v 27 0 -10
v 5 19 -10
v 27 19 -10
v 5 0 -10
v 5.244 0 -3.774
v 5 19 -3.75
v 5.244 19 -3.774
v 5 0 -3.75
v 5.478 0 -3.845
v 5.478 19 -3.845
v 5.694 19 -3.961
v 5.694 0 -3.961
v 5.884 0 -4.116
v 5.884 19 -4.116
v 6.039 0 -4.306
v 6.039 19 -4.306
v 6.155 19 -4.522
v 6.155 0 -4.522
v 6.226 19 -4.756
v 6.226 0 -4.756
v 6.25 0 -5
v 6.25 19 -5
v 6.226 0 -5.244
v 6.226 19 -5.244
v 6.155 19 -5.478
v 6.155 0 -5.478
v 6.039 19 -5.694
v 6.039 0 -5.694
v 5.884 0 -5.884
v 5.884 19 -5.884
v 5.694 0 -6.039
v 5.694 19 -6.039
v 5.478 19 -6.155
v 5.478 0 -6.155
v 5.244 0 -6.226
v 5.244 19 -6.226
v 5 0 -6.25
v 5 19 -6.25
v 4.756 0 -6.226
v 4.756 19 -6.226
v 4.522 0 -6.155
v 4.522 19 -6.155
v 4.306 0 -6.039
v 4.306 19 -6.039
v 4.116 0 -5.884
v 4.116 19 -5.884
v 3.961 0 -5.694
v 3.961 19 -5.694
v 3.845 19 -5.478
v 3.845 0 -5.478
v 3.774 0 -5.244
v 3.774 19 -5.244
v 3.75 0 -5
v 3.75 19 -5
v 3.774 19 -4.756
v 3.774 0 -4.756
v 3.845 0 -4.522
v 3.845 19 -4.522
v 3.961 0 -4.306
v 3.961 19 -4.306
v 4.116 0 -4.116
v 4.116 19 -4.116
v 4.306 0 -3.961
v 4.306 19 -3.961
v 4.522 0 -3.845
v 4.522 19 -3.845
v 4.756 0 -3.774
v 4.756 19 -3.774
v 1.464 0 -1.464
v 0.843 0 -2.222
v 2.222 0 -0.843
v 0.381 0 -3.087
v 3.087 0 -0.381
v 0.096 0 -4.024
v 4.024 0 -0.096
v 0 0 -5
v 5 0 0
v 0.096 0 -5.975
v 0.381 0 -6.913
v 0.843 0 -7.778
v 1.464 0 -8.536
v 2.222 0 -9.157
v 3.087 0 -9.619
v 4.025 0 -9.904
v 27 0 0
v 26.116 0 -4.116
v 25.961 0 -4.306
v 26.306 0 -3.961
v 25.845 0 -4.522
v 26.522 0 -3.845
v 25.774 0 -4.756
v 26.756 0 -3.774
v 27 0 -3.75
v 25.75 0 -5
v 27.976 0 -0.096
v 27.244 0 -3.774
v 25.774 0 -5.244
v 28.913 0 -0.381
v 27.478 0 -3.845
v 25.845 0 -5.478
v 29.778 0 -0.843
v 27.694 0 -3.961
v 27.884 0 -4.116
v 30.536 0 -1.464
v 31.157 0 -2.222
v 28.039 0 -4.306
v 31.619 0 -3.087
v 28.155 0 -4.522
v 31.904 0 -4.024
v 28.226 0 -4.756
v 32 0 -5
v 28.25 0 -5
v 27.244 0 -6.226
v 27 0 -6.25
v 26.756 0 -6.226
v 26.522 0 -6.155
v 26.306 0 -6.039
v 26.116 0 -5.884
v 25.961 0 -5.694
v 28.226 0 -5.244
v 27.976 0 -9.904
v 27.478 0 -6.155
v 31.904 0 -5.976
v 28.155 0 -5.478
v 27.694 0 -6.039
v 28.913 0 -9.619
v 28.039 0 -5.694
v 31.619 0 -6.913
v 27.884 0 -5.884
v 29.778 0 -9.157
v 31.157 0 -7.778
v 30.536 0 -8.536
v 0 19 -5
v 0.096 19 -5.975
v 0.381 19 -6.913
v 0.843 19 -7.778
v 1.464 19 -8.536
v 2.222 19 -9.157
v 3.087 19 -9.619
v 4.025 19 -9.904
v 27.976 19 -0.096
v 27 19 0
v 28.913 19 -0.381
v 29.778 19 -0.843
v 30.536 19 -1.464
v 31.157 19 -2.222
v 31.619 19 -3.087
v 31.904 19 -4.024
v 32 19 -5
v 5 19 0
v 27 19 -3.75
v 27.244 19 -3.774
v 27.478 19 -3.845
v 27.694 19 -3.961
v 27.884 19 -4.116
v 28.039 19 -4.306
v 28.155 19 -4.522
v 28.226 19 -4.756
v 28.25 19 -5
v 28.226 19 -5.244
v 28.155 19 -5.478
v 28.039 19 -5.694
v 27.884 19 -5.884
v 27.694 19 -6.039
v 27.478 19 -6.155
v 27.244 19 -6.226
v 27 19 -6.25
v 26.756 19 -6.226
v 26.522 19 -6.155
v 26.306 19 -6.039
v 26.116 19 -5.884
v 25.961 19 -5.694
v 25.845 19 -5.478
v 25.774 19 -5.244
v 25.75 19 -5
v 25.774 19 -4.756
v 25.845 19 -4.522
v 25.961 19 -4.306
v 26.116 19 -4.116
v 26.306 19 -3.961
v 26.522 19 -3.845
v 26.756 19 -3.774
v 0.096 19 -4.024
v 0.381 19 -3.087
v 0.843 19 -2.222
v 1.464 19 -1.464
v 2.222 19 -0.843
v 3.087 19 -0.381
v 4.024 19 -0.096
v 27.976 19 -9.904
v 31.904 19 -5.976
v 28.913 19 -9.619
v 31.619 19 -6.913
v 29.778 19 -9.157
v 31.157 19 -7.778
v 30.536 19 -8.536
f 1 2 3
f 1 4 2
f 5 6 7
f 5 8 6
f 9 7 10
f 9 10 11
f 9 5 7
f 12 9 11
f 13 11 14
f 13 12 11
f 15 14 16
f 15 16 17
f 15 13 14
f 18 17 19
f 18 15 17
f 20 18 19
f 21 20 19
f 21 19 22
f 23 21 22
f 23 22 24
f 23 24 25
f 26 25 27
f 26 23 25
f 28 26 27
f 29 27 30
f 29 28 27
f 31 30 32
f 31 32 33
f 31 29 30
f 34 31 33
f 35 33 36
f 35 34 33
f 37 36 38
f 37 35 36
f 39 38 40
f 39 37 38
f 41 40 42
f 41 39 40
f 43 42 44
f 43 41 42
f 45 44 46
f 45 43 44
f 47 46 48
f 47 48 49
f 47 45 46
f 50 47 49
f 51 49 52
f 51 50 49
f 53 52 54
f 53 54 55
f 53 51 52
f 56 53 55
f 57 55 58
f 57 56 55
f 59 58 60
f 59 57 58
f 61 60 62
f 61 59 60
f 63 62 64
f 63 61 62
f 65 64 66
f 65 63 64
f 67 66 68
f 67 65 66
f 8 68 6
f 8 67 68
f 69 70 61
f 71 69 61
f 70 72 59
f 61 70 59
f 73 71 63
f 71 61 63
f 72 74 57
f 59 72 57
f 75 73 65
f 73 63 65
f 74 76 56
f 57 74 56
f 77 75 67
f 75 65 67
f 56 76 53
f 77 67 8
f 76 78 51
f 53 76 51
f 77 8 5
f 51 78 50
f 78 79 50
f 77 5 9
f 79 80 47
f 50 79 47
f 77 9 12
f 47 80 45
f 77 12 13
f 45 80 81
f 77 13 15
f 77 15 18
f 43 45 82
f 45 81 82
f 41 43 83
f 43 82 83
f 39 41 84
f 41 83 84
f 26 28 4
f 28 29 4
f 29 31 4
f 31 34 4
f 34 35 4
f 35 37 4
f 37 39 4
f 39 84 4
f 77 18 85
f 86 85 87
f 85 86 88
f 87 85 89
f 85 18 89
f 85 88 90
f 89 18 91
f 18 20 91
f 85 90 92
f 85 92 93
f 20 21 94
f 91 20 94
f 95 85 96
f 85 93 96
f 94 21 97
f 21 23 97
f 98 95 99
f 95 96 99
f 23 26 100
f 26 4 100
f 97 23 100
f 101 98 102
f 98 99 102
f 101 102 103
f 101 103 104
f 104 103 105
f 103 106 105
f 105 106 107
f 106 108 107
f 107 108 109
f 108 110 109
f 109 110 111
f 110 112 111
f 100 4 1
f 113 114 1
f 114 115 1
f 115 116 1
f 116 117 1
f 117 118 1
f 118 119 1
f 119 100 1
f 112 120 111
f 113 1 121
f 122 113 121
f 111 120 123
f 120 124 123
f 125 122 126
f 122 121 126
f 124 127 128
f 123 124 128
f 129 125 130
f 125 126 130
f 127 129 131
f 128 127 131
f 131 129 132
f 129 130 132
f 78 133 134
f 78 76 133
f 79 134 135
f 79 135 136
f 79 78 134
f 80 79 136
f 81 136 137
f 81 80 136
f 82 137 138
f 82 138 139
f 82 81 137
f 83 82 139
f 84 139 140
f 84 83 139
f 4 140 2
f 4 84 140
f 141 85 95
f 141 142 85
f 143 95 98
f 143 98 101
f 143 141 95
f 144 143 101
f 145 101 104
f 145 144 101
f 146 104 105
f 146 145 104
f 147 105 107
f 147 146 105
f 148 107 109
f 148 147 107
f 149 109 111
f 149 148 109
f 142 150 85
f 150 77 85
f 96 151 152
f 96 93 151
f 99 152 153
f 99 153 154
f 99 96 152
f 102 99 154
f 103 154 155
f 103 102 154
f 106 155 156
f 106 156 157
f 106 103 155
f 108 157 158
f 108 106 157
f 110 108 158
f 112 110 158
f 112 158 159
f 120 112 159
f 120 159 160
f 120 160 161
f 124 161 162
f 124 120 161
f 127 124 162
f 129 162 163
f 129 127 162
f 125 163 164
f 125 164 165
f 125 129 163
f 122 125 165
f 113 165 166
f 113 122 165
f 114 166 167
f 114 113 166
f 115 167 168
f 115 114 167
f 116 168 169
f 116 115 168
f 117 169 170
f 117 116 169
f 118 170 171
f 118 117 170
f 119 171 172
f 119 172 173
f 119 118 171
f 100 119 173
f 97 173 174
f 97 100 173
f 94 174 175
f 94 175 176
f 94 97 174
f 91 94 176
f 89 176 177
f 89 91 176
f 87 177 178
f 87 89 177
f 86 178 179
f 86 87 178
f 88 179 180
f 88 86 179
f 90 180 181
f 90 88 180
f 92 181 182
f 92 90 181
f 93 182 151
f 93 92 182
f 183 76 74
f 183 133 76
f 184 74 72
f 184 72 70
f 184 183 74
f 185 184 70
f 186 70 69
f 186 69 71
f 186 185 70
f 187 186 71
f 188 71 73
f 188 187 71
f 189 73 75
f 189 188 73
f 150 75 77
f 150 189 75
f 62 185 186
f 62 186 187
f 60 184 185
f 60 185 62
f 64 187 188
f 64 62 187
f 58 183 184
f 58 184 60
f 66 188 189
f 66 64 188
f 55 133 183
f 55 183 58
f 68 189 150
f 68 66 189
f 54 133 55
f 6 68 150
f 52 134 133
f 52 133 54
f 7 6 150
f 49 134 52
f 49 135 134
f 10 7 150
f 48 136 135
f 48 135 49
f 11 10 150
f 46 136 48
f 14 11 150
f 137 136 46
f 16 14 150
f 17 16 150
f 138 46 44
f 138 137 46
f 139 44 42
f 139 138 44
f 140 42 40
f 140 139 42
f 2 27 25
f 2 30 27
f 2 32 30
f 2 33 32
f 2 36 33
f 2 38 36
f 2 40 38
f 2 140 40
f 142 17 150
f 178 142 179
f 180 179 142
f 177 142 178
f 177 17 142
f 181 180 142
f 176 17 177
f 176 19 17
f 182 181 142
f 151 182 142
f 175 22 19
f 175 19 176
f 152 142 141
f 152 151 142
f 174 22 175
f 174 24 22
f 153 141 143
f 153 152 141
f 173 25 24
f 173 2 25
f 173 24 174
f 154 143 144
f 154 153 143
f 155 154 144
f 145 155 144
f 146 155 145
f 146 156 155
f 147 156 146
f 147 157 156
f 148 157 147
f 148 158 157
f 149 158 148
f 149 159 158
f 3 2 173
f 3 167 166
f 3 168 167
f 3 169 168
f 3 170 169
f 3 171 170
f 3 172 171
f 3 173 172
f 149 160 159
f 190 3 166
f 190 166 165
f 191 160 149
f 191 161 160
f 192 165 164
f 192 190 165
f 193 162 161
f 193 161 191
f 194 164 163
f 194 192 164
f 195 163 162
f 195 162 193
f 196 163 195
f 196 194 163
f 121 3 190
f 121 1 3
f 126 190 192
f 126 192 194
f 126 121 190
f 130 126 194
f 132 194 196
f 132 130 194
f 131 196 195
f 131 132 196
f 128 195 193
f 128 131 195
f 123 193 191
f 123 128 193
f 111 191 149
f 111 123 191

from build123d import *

# Parameters (mm, degrees)
SKETCH_1_W      = 32
SKETCH_1_H      = 10
SKETCH_1_R      = 1.25
EXTRUDE_1_DEPTH = 18
SKETCH_4_W      = 32
SKETCH_4_H      = 10
SKETCH_4_R      = 1.25
EXTRUDE_3_DEPTH = 1
FILLET_3_R      = 5
FILLET_4_R      = 5


with BuildPart() as part:
    # 草图1 → 凸台-拉伸1 (new body)
    with BuildSketch(Plane(origin=(0, 0, 0), x_dir=(1, 0, 0), z_dir=(0, 1, 0))):
        with Locations((16, 5)):
            Rectangle(SKETCH_1_W, SKETCH_1_H)
        with Locations(Location((5, 5, 0), (0, 0, 270))):
            Circle(SKETCH_1_R, mode=Mode.SUBTRACT)
        with Locations(Location((27, 5, 0), (0, 0, 270))):
            Circle(SKETCH_1_R, mode=Mode.SUBTRACT)
    extrude(amount=EXTRUDE_1_DEPTH)

    # 草图4 → 凸台-拉伸3 (add)
    with BuildSketch(Plane(origin=(0, 18, 0), x_dir=(1, 0, 0), z_dir=(0, 1, 0))):
        with Locations((16, 5)):
            Rectangle(SKETCH_4_W, SKETCH_4_H)
        with Locations(Location((5, 5, 0), (0, 0, 270))):
            Circle(SKETCH_4_R, mode=Mode.SUBTRACT)
        with Locations(Location((27, 5, 0), (0, 0, 270))):
            Circle(SKETCH_4_R, mode=Mode.SUBTRACT)
    extrude(amount=EXTRUDE_3_DEPTH)

    # 圆角3
    fillet_3_edges = [part.edges().sort_by_distance(p)[0] for p in [
        (0, 9.5, -10),
    ]]
    fillet(fillet_3_edges, radius=FILLET_3_R)

    # 圆角4
    fillet_4_edges = [part.edges().sort_by_distance(p)[0] for p in [
        (32, 9.5, -10),
        (32, 9.5, 0),
        (0, 9.5, 0),
    ]]
    fillet(fillet_4_edges, radius=FILLET_4_R - 0.0001)  # a hair under: the kernel refuses the full size


solid = part.part
